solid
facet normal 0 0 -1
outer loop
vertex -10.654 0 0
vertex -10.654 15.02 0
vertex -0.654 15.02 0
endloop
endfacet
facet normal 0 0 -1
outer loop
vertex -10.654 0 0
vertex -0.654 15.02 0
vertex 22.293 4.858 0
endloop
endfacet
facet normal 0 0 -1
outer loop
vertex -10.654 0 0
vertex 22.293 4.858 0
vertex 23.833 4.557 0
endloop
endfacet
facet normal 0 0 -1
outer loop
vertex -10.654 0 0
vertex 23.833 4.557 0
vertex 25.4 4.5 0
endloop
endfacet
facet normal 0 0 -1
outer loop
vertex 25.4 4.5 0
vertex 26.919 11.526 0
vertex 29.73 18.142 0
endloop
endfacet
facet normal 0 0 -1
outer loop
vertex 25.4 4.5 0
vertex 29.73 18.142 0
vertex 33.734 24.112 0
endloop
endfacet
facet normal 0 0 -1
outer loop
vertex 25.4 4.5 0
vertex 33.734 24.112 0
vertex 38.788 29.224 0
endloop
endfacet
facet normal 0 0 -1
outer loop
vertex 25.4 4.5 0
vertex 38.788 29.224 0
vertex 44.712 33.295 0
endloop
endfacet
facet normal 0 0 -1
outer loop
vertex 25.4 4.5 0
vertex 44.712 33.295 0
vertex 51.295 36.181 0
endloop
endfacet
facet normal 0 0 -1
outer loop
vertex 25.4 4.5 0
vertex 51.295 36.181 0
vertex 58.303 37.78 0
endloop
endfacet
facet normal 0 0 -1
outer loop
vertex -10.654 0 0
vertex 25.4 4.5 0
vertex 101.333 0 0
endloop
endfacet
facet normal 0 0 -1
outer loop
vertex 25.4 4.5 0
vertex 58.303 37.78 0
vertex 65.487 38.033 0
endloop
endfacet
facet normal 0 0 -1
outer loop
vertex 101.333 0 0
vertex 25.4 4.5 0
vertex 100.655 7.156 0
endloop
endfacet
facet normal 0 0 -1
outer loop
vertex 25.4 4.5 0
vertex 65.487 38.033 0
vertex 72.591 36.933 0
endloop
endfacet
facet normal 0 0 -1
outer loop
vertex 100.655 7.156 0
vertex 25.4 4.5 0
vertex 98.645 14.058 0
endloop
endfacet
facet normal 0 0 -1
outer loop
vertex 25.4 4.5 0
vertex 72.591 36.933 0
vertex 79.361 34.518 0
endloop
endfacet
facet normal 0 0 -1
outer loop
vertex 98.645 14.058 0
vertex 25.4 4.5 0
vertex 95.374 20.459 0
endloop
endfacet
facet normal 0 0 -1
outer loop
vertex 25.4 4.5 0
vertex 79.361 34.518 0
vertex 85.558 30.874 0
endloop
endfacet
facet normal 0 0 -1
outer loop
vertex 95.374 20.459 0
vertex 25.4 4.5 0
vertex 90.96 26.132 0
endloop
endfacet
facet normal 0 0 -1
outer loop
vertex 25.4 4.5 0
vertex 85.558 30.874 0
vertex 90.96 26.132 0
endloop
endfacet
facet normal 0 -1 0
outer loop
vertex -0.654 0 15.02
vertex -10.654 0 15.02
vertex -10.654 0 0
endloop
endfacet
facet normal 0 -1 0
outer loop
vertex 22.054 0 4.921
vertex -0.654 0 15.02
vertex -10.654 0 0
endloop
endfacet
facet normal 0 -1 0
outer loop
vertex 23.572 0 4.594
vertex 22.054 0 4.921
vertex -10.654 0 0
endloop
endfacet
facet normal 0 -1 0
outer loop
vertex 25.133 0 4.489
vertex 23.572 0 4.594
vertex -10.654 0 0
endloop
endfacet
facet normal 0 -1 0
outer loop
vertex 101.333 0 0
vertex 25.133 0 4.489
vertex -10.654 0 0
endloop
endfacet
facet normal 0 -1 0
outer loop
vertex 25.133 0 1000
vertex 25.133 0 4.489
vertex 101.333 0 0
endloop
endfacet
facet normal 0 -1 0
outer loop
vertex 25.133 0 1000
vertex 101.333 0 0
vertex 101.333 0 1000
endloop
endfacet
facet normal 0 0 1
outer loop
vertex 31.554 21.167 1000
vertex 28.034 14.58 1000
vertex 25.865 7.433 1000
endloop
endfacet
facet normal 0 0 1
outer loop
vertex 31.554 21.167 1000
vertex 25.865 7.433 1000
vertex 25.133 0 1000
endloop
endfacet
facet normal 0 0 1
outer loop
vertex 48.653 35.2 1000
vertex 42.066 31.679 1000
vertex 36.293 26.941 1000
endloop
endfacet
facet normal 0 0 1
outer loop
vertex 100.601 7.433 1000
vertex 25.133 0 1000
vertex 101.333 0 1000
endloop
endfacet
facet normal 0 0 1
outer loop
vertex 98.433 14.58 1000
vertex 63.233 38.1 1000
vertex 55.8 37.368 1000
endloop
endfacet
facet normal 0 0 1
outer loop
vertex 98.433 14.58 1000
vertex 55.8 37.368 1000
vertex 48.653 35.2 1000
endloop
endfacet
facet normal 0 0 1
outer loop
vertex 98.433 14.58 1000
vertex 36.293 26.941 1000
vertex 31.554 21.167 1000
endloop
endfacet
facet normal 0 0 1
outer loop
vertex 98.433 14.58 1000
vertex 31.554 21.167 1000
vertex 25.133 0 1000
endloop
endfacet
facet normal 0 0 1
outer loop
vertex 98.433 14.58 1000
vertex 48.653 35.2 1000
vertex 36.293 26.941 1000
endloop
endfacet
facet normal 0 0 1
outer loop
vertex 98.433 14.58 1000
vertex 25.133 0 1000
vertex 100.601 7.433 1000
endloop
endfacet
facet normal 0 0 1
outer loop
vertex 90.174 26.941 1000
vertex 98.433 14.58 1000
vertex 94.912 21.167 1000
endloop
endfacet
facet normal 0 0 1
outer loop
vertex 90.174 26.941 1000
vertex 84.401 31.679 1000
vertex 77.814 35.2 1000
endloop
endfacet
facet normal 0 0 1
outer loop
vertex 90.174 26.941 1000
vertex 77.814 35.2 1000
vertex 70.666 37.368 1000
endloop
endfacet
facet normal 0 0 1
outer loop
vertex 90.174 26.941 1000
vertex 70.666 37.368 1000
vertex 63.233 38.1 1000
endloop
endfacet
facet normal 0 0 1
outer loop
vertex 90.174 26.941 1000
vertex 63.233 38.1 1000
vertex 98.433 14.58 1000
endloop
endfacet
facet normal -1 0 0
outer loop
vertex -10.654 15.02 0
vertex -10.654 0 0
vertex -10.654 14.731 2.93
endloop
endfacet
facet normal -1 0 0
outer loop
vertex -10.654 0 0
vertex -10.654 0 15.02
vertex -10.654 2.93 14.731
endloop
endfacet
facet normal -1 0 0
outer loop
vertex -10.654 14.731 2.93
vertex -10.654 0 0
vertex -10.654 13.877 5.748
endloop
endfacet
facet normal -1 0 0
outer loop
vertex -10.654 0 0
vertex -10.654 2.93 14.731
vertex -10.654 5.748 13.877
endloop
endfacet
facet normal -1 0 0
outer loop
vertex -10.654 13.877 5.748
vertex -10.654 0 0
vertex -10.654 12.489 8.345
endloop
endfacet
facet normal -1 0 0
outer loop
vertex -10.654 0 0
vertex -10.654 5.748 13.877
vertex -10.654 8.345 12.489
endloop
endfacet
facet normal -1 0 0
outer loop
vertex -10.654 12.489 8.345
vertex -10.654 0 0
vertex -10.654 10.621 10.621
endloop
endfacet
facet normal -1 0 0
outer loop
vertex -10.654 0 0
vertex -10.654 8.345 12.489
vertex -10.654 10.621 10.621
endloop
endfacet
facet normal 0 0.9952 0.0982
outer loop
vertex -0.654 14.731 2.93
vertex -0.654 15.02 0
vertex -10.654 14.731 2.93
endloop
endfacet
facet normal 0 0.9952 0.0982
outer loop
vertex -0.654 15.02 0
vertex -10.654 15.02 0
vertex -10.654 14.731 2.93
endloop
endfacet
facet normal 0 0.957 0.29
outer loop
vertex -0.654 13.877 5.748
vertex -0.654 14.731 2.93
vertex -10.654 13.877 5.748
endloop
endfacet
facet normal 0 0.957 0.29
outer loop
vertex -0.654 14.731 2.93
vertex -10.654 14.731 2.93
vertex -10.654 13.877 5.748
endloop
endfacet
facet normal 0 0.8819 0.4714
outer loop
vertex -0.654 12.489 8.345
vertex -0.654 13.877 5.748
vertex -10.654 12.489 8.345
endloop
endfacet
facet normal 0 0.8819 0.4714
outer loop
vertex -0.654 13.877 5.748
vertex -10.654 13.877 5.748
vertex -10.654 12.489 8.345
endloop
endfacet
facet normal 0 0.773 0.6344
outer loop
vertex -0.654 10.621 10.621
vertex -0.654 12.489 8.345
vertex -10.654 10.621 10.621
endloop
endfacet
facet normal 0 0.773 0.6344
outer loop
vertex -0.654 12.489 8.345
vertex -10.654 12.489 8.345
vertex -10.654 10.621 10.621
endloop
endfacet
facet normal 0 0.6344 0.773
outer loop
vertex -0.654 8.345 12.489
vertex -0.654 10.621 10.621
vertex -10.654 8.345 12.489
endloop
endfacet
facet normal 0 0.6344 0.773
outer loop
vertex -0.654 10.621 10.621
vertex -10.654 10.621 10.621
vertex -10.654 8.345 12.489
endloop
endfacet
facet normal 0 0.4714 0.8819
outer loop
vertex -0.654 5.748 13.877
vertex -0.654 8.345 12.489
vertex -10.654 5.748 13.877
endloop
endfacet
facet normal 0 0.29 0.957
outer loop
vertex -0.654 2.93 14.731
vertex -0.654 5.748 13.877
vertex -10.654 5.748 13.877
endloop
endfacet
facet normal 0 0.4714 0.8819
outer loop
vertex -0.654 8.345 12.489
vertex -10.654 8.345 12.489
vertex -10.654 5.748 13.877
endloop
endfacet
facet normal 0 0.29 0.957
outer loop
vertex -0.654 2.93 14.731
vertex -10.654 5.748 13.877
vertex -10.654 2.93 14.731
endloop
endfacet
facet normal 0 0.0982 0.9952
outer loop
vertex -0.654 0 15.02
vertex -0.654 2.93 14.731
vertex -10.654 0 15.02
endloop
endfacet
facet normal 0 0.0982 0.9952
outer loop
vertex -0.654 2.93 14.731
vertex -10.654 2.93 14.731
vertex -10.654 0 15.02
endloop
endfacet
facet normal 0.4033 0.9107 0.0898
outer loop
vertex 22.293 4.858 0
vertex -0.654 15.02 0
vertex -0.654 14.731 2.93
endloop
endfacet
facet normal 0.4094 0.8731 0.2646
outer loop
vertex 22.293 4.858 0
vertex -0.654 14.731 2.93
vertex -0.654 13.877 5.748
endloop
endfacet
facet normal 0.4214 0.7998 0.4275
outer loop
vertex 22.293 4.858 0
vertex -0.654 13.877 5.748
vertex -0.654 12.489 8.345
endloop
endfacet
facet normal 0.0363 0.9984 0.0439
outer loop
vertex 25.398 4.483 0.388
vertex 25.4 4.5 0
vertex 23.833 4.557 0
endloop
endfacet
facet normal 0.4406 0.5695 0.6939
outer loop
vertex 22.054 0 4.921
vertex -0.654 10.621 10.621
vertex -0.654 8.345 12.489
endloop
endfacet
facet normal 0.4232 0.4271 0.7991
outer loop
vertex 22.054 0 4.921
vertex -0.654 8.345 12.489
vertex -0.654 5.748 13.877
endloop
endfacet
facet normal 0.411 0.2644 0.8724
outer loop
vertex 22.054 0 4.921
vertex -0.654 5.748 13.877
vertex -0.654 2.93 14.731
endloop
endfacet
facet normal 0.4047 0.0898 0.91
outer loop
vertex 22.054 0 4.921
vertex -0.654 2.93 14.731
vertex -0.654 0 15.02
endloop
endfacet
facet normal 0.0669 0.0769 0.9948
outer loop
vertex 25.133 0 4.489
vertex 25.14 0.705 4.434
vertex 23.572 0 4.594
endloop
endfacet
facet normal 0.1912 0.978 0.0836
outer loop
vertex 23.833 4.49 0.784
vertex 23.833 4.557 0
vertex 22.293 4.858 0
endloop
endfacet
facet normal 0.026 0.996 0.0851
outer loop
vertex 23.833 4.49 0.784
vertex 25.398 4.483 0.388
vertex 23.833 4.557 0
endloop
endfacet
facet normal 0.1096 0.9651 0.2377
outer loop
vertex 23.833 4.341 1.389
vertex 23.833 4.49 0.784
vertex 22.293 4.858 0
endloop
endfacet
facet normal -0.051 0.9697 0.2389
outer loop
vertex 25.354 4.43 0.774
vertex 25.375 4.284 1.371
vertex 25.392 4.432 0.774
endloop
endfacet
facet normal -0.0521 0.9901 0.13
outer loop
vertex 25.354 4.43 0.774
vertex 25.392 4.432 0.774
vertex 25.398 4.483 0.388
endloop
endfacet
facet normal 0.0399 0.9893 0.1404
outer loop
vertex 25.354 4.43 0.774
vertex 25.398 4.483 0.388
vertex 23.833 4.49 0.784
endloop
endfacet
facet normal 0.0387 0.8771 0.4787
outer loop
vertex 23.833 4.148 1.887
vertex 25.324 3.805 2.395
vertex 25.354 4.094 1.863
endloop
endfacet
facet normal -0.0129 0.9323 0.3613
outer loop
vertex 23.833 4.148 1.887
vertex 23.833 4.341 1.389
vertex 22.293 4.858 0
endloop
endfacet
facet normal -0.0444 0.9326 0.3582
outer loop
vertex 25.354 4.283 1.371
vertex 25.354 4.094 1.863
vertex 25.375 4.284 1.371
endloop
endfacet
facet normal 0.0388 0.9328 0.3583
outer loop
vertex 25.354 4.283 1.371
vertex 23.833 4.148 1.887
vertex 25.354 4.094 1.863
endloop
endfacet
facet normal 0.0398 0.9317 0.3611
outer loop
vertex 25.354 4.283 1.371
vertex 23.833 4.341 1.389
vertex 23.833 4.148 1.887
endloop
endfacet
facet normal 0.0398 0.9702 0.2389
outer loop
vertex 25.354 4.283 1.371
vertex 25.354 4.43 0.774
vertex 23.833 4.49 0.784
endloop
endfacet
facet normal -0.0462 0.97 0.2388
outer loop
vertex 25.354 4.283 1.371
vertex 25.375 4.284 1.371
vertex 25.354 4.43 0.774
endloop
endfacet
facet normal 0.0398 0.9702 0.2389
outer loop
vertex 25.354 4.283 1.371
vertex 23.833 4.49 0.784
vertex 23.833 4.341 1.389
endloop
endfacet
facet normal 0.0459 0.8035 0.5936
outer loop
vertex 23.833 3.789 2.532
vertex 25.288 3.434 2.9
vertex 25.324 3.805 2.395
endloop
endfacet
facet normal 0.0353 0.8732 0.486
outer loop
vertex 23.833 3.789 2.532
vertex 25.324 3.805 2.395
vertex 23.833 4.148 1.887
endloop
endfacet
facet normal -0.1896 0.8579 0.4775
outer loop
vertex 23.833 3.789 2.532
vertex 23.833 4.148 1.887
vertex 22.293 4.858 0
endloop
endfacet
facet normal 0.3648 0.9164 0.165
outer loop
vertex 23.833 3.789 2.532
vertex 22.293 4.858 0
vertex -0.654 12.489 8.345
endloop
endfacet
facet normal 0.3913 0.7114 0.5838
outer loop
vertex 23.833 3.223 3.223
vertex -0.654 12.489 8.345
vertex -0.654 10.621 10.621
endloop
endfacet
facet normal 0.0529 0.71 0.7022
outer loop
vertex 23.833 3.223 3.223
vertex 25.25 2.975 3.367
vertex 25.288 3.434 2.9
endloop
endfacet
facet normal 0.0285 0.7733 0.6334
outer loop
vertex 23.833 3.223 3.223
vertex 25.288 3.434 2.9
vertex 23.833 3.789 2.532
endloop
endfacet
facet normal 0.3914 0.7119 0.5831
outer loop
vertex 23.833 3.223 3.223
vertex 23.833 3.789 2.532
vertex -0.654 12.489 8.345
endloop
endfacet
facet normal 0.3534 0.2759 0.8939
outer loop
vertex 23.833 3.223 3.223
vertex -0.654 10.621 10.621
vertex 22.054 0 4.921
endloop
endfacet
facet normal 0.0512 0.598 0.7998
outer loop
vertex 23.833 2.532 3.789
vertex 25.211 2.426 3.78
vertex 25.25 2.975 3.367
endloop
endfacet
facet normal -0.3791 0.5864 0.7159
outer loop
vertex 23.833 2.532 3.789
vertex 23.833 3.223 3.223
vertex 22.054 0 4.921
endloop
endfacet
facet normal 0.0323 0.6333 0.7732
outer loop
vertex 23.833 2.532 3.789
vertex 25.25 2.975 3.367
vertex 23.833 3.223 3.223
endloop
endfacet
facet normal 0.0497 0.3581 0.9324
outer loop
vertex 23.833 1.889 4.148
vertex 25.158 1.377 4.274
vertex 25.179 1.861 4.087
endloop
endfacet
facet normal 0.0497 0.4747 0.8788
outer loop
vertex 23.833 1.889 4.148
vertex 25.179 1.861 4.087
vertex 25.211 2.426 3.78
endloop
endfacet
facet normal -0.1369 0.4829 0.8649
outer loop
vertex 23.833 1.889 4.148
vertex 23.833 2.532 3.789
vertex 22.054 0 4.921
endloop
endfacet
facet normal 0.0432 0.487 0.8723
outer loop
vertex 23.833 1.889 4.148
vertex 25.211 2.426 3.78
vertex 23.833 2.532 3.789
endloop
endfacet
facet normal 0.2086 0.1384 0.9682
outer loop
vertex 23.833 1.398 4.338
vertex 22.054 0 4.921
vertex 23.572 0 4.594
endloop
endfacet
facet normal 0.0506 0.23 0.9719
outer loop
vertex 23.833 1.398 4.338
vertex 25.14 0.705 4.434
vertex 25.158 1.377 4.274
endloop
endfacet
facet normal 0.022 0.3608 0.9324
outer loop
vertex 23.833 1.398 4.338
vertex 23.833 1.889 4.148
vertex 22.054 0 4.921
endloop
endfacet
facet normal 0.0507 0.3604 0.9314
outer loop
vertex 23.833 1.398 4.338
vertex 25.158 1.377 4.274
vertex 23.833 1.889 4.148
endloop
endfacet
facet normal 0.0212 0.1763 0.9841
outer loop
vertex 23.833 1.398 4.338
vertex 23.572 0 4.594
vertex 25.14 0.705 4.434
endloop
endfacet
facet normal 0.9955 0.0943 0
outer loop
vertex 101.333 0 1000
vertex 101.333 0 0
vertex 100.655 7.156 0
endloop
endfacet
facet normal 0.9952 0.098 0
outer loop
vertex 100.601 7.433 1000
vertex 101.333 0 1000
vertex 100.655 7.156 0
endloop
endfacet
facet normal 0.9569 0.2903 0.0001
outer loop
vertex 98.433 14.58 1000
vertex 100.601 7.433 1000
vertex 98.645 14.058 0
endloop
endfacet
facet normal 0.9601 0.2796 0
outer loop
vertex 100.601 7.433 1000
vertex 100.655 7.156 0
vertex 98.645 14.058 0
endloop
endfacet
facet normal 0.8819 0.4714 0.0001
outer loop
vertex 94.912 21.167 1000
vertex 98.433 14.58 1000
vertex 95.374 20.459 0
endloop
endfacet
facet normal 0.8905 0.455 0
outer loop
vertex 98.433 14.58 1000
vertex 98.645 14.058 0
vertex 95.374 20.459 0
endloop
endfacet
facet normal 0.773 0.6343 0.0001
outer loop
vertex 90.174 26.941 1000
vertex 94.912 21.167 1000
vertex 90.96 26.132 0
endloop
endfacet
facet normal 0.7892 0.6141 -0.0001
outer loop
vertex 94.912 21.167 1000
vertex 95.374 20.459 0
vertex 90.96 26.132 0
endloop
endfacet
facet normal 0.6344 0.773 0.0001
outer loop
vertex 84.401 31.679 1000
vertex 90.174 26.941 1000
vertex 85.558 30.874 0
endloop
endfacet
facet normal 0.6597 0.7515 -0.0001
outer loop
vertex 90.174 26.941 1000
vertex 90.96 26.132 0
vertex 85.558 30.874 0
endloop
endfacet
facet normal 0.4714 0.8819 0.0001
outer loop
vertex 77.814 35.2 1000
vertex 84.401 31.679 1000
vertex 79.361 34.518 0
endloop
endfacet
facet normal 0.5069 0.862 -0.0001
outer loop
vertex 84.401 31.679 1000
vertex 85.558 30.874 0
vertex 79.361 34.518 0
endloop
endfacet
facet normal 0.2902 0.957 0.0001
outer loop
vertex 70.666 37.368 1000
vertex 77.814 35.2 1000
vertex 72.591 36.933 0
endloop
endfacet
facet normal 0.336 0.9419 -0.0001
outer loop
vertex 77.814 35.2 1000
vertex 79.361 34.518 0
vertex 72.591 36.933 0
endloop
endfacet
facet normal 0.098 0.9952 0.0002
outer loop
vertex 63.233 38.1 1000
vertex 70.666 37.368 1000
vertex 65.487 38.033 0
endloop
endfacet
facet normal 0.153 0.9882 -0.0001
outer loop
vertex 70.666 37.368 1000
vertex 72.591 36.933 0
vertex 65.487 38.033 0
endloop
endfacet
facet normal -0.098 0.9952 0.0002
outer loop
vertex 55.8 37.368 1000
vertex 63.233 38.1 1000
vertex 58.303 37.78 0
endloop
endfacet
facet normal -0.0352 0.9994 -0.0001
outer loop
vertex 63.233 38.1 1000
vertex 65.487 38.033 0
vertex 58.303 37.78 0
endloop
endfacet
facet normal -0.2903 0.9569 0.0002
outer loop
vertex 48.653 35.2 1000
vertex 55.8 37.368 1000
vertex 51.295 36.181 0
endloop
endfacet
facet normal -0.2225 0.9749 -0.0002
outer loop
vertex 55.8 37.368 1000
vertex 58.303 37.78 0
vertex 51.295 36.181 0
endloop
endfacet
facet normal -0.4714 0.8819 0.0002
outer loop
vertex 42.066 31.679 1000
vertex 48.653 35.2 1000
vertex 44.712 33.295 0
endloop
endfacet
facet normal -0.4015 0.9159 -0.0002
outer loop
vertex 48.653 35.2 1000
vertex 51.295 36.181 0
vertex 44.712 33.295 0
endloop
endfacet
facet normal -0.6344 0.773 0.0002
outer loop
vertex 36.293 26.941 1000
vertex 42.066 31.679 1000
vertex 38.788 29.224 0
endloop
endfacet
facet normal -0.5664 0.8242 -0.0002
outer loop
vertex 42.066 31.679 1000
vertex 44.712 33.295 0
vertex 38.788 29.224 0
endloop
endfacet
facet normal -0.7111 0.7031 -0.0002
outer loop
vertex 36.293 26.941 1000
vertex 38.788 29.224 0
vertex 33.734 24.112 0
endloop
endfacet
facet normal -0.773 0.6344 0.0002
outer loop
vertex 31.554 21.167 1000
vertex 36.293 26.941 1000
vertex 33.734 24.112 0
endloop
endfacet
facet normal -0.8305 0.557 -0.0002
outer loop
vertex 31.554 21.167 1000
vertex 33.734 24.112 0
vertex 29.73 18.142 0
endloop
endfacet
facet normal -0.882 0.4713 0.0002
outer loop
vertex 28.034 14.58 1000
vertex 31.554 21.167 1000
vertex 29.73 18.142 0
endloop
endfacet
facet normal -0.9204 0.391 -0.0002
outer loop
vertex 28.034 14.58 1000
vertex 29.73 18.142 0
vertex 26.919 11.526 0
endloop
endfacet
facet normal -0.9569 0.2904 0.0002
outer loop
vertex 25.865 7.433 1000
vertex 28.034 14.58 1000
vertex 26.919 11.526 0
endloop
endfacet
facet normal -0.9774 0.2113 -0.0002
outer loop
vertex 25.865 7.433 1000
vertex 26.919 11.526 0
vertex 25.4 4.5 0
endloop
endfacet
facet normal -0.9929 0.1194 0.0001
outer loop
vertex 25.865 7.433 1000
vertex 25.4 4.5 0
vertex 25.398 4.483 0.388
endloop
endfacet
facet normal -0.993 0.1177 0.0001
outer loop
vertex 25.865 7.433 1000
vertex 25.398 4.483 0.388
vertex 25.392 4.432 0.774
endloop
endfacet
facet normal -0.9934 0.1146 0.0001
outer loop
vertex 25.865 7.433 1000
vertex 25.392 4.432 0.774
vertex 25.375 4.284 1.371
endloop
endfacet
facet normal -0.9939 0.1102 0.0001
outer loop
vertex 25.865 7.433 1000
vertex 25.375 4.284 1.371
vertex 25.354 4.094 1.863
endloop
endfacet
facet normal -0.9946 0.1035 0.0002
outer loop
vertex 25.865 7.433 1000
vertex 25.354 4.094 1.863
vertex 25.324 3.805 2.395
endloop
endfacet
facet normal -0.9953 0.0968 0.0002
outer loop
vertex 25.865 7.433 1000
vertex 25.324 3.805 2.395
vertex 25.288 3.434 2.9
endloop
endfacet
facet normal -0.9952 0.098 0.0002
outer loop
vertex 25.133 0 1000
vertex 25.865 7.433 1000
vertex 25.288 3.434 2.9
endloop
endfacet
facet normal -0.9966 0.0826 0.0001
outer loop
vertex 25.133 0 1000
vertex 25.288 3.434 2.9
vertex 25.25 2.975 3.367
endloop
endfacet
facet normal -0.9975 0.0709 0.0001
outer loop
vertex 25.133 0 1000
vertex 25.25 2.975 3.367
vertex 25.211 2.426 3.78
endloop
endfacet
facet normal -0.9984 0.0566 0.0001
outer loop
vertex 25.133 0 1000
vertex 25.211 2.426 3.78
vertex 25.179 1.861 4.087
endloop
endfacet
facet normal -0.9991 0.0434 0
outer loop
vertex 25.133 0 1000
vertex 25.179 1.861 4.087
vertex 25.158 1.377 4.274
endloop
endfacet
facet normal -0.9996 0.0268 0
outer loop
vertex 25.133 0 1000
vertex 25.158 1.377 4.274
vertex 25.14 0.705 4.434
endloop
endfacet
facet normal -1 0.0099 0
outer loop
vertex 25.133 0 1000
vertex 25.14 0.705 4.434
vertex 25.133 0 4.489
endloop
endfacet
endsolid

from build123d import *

# Parameters (mm, degrees)
REVOLVE3_ANGLE      = 90
BOSS_EXTRUDE2_DEPTH = 1000


with BuildPart() as part:
    # Sketch2 → Revolve3 (revolve)
    with BuildSketch(Plane.XY):
        with BuildLine():
            Line((-0.654182434, 15.02), (-10.654182434, 15.02))
            Line((-10.654182434, 15.02), (-10.654182434, 0))
            Line((-10.654182434, 0), (0, 0))
            Line((0, 0), (25.4, 0))
            Line((25.4, 0), (35.4, 0))
            Line((35.4, 0), (35.4, 4.5))
            Line((35.4, 4.5), (25.4, 4.5))
            add(Edge.make_bspline(
                [(-0.654182434, 15.02), (-0.219836229, 14.810704372), (0.610598489, 14.410982375), (2.74095302, 13.386545583), (4.34709547, 12.619135975), (6.701613478, 11.49599419), (8.606916476, 10.59589253), (10.790885987, 9.570629713), (12.810835282, 8.63757915), (14.944119423, 7.669787097), (16.950761864, 6.79193378), (18.75556814, 6.044207346), (20.238794329, 5.486207444), (21.39416777, 5.103578745), (22.215591012, 4.870934478), (22.897035956, 4.710298297), (23.464492683, 4.605633048), (23.954091395, 4.538072471), (24.354277235, 4.503624983), (24.669284768, 4.488813447), (24.918595629, 4.485402054), (25.124701431, 4.488218611), (25.279381224, 4.493757229), (25.359889237, 4.497669109), (25.4, 4.5)],
                knots=[0.083771138, 0.083771138, 0.083771138, 0.083771138, 0.083771138, 0.152014176, 0.220257214, 0.288500251, 0.356743288, 0.424986327, 0.493229366, 0.561472406, 0.629715448, 0.697958493, 0.757156968, 0.791278497, 0.81934393, 0.841893906, 0.858954658, 0.874282948, 0.887931591, 0.900718778, 0.906405686, 0.912092593, 0.917779499, 0.923466404, 0.923466404, 0.923466404, 0.923466404, 0.923466404], degree=4))
        make_face()
    revolve(axis=Axis((0, 0, 0), (1, 0, 0)), revolution_arc=REVOLVE3_ANGLE)

    # Sketch11 → Boss-Extrude2 (add)
    with BuildSketch(Plane.XY):
        with BuildLine():
            Line((25.133318649, 0), (101.333318649, 0))
            ThreePointArc((101.333318649, 0), (63.233318649, 38.1), (25.133318649, 0))
        make_face()
    extrude(amount=BOSS_EXTRUDE2_DEPTH)


solid = part.part
